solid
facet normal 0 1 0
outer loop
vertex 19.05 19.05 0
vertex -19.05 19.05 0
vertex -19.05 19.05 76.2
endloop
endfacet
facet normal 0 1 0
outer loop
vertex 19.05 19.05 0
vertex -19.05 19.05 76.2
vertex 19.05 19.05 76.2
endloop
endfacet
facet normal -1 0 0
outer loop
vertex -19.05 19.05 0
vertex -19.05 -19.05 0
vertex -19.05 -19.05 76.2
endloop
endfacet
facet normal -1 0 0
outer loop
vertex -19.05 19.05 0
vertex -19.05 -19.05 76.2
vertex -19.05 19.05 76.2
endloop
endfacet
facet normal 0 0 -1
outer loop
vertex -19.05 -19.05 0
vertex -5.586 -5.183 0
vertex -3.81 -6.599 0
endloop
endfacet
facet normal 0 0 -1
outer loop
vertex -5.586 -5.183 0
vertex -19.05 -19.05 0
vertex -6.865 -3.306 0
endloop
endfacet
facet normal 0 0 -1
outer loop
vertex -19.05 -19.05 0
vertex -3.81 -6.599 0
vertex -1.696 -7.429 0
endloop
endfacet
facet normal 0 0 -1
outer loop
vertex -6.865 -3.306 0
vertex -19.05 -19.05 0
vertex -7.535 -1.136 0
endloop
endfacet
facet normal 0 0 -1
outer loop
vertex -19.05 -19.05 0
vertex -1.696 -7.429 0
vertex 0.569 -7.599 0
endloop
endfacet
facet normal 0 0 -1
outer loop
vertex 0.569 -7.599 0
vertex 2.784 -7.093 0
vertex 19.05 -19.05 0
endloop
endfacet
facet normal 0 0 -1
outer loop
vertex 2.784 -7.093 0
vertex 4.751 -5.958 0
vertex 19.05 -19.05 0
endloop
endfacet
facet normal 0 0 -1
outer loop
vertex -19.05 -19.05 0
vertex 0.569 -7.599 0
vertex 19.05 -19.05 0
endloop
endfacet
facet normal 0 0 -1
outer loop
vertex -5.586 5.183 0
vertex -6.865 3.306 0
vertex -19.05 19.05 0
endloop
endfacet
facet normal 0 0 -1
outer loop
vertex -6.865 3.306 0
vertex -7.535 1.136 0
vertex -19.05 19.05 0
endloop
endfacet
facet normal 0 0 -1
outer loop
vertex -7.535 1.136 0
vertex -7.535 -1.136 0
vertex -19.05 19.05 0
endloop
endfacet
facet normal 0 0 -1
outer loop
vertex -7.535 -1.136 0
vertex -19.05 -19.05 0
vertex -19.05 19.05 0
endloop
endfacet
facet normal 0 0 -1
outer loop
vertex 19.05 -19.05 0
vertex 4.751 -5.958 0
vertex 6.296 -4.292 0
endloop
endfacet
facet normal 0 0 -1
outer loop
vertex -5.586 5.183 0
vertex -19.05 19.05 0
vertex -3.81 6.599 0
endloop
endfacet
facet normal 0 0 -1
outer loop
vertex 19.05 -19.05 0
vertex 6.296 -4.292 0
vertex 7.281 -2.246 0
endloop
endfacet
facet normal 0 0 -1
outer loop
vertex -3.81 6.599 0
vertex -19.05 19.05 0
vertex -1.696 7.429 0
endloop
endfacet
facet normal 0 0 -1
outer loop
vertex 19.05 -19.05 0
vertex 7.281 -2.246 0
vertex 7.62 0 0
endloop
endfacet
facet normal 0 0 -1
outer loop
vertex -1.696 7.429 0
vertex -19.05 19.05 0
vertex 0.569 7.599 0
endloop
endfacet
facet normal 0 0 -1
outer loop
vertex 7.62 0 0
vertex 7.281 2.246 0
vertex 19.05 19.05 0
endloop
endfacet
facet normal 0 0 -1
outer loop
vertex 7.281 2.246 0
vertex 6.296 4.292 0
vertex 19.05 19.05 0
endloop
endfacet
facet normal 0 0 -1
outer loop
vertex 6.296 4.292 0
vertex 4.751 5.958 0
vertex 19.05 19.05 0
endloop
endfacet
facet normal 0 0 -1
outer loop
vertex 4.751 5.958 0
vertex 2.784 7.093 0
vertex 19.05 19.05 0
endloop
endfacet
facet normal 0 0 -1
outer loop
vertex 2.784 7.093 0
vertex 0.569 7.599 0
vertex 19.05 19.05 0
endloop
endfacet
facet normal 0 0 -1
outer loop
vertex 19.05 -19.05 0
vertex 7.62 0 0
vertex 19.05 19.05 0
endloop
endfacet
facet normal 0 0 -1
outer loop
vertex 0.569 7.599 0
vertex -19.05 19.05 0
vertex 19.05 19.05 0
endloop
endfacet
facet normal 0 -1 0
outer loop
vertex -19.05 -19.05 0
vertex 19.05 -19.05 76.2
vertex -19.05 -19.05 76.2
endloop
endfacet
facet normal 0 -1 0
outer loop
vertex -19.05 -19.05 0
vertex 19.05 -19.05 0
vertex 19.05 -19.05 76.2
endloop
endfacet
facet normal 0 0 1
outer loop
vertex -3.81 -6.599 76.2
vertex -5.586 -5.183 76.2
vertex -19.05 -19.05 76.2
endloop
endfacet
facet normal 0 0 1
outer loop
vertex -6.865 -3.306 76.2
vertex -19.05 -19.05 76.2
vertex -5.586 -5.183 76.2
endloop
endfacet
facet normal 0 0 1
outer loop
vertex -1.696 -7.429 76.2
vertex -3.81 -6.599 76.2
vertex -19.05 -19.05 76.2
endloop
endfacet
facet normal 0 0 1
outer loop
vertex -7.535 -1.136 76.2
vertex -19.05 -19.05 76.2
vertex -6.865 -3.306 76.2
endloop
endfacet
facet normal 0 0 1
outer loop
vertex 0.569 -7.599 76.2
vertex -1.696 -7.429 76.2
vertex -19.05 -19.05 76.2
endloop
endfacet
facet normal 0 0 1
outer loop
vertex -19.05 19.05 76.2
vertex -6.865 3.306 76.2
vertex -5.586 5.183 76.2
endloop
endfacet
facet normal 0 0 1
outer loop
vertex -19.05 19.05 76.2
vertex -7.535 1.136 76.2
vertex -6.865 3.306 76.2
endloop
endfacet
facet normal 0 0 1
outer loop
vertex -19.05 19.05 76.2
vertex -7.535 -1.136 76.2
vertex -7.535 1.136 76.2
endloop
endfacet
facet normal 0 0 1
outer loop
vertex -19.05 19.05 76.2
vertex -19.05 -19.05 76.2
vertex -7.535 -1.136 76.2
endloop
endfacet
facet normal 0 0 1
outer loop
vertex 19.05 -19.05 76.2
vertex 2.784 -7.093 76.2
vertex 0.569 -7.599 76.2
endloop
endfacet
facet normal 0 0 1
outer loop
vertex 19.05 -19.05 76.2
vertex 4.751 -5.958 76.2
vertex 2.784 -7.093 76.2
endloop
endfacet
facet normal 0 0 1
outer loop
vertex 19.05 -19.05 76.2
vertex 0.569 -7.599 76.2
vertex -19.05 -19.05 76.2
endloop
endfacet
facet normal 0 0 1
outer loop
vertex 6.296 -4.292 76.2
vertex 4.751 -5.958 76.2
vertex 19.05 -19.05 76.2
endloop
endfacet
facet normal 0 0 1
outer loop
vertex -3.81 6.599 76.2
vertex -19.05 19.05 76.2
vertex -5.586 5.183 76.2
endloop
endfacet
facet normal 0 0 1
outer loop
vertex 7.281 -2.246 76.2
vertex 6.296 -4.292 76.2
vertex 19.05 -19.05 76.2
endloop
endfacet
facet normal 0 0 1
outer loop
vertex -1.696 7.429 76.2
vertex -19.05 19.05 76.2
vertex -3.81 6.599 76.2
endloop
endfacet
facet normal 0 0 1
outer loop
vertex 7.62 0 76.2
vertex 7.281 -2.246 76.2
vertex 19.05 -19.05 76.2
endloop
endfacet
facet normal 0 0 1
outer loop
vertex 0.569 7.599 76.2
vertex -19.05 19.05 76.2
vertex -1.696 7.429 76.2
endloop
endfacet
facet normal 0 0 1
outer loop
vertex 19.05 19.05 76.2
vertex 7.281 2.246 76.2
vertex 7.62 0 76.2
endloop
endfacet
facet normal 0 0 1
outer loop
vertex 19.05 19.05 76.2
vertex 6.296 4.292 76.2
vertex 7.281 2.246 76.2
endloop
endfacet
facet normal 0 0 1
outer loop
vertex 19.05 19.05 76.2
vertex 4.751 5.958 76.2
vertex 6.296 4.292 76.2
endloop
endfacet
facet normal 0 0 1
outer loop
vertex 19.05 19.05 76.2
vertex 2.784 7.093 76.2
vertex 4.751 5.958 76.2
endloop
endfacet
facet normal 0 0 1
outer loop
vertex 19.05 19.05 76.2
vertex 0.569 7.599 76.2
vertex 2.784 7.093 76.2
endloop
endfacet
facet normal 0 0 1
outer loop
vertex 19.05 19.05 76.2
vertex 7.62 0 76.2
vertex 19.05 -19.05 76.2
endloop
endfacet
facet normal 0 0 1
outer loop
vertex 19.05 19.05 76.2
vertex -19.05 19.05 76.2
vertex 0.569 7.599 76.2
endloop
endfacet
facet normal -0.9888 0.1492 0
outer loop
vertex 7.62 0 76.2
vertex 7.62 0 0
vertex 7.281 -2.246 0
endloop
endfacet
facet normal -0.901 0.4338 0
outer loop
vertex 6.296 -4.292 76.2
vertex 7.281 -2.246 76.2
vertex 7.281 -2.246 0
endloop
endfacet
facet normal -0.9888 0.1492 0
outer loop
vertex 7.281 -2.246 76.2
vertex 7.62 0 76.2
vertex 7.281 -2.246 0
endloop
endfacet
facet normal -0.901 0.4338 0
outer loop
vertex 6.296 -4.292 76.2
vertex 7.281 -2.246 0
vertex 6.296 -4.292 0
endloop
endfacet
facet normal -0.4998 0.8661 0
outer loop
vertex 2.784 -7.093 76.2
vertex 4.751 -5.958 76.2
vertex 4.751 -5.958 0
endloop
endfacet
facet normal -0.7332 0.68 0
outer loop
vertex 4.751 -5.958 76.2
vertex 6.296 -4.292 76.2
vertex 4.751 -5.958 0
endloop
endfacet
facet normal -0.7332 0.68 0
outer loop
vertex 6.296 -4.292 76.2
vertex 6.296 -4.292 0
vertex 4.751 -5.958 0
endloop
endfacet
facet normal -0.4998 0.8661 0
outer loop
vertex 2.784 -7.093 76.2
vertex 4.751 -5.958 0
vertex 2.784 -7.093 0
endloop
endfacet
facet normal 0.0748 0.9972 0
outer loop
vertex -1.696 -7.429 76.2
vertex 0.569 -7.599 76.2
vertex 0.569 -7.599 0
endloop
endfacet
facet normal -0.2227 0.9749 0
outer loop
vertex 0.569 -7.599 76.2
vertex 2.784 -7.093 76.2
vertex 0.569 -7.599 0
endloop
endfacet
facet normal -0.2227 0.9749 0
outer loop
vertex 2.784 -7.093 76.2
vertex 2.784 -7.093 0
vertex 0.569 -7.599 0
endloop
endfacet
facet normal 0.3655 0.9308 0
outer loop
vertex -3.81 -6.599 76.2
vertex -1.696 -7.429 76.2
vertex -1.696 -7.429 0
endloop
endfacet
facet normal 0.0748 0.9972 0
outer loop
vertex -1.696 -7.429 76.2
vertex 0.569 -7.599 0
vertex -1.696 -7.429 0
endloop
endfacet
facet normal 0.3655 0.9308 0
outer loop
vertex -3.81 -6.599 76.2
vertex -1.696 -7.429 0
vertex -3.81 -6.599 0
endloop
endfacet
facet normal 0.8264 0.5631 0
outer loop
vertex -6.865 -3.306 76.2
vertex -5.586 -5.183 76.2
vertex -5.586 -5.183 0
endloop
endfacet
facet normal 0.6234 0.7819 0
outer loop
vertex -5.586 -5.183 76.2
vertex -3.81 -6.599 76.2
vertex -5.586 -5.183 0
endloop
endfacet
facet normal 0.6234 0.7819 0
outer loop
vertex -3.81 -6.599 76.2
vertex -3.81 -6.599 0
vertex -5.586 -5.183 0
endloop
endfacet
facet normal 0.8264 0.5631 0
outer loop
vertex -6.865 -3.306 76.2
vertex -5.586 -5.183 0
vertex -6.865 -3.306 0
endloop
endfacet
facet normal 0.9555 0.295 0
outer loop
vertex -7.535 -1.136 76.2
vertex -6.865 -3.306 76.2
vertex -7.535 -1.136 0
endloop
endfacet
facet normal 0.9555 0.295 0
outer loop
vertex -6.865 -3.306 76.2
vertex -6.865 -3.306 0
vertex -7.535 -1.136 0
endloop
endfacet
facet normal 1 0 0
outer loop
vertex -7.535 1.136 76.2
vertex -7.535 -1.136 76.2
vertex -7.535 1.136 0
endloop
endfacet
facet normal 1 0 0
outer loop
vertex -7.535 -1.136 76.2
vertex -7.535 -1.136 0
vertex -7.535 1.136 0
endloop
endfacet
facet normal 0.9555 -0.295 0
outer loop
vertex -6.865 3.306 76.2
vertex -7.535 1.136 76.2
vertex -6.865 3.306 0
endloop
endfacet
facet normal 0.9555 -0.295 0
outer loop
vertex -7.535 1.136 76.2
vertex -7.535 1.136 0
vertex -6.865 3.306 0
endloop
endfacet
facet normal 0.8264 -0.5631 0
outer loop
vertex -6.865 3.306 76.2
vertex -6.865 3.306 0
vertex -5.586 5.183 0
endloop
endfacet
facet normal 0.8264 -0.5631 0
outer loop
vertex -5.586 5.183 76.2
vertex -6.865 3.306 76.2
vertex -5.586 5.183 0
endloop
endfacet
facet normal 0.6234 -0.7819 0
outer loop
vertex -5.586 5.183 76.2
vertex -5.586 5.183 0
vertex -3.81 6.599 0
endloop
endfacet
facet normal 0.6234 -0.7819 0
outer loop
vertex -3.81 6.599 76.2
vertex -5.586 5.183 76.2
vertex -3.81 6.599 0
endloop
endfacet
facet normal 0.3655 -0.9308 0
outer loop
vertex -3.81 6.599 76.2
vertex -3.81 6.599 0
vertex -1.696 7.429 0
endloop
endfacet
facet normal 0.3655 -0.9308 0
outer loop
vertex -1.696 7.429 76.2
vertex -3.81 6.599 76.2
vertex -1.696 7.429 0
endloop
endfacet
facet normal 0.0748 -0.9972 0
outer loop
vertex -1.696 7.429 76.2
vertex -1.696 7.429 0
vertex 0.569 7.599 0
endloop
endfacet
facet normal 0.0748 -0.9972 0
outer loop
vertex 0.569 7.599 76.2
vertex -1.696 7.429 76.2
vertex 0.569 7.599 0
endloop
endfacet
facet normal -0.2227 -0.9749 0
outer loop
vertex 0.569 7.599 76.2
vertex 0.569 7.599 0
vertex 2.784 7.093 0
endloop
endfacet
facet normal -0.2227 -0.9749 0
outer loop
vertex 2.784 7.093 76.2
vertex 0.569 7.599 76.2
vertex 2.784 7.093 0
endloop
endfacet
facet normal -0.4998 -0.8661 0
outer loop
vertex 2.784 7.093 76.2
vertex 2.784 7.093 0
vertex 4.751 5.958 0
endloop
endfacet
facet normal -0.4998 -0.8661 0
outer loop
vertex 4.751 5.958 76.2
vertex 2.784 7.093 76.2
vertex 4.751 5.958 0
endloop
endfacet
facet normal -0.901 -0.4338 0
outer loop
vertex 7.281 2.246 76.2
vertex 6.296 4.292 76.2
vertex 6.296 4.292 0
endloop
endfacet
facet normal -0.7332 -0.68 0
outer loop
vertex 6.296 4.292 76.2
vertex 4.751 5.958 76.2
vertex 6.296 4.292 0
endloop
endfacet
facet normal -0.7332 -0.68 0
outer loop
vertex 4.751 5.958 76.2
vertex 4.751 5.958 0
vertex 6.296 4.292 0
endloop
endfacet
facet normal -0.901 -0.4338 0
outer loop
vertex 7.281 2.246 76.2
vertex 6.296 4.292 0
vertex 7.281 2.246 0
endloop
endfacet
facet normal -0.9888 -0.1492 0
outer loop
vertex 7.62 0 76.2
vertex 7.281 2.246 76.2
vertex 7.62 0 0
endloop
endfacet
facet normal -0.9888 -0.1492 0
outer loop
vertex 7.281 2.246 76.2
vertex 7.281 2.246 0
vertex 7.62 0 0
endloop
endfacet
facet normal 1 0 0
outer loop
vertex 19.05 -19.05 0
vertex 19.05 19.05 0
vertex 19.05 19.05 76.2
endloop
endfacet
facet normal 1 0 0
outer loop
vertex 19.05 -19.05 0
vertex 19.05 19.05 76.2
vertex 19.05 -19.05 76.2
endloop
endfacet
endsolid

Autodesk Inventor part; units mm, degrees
ref_plane "YZ Plane" through (0, 0, 0) normal (1, 0, 0) x (0, 1, 0)
ref_plane "XZ Plane" through (0, 0, 0) normal (0, 1, 0) x (-1, 0, 0)
ref_plane "XY Plane" through (0, 0, 0) normal (0, 0, 1) x (1, 0, 0)
sketch "Sketch1" plane through (0, 0, 0) normal (0, 0, 1) x (1, 0, 0)
  line L0 (19.05, -19.05) -> (-19.05, -19.05)
  line L1 (-19.05, -19.05) -> (-19.05, 19.05)
  line L2 (-19.05, 19.05) -> (19.05, 19.05)
  line L3 (19.05, 19.05) -> (19.05, -19.05)
  circle A0 centre (0, 0) radius 7.62
  dimension "d0" = 38.1
  dimension "d1" = 15.24
extrude "Extrusion1" add sketch "Sketch1" along normal blind 76.2
properties part number "middleAXIS"
